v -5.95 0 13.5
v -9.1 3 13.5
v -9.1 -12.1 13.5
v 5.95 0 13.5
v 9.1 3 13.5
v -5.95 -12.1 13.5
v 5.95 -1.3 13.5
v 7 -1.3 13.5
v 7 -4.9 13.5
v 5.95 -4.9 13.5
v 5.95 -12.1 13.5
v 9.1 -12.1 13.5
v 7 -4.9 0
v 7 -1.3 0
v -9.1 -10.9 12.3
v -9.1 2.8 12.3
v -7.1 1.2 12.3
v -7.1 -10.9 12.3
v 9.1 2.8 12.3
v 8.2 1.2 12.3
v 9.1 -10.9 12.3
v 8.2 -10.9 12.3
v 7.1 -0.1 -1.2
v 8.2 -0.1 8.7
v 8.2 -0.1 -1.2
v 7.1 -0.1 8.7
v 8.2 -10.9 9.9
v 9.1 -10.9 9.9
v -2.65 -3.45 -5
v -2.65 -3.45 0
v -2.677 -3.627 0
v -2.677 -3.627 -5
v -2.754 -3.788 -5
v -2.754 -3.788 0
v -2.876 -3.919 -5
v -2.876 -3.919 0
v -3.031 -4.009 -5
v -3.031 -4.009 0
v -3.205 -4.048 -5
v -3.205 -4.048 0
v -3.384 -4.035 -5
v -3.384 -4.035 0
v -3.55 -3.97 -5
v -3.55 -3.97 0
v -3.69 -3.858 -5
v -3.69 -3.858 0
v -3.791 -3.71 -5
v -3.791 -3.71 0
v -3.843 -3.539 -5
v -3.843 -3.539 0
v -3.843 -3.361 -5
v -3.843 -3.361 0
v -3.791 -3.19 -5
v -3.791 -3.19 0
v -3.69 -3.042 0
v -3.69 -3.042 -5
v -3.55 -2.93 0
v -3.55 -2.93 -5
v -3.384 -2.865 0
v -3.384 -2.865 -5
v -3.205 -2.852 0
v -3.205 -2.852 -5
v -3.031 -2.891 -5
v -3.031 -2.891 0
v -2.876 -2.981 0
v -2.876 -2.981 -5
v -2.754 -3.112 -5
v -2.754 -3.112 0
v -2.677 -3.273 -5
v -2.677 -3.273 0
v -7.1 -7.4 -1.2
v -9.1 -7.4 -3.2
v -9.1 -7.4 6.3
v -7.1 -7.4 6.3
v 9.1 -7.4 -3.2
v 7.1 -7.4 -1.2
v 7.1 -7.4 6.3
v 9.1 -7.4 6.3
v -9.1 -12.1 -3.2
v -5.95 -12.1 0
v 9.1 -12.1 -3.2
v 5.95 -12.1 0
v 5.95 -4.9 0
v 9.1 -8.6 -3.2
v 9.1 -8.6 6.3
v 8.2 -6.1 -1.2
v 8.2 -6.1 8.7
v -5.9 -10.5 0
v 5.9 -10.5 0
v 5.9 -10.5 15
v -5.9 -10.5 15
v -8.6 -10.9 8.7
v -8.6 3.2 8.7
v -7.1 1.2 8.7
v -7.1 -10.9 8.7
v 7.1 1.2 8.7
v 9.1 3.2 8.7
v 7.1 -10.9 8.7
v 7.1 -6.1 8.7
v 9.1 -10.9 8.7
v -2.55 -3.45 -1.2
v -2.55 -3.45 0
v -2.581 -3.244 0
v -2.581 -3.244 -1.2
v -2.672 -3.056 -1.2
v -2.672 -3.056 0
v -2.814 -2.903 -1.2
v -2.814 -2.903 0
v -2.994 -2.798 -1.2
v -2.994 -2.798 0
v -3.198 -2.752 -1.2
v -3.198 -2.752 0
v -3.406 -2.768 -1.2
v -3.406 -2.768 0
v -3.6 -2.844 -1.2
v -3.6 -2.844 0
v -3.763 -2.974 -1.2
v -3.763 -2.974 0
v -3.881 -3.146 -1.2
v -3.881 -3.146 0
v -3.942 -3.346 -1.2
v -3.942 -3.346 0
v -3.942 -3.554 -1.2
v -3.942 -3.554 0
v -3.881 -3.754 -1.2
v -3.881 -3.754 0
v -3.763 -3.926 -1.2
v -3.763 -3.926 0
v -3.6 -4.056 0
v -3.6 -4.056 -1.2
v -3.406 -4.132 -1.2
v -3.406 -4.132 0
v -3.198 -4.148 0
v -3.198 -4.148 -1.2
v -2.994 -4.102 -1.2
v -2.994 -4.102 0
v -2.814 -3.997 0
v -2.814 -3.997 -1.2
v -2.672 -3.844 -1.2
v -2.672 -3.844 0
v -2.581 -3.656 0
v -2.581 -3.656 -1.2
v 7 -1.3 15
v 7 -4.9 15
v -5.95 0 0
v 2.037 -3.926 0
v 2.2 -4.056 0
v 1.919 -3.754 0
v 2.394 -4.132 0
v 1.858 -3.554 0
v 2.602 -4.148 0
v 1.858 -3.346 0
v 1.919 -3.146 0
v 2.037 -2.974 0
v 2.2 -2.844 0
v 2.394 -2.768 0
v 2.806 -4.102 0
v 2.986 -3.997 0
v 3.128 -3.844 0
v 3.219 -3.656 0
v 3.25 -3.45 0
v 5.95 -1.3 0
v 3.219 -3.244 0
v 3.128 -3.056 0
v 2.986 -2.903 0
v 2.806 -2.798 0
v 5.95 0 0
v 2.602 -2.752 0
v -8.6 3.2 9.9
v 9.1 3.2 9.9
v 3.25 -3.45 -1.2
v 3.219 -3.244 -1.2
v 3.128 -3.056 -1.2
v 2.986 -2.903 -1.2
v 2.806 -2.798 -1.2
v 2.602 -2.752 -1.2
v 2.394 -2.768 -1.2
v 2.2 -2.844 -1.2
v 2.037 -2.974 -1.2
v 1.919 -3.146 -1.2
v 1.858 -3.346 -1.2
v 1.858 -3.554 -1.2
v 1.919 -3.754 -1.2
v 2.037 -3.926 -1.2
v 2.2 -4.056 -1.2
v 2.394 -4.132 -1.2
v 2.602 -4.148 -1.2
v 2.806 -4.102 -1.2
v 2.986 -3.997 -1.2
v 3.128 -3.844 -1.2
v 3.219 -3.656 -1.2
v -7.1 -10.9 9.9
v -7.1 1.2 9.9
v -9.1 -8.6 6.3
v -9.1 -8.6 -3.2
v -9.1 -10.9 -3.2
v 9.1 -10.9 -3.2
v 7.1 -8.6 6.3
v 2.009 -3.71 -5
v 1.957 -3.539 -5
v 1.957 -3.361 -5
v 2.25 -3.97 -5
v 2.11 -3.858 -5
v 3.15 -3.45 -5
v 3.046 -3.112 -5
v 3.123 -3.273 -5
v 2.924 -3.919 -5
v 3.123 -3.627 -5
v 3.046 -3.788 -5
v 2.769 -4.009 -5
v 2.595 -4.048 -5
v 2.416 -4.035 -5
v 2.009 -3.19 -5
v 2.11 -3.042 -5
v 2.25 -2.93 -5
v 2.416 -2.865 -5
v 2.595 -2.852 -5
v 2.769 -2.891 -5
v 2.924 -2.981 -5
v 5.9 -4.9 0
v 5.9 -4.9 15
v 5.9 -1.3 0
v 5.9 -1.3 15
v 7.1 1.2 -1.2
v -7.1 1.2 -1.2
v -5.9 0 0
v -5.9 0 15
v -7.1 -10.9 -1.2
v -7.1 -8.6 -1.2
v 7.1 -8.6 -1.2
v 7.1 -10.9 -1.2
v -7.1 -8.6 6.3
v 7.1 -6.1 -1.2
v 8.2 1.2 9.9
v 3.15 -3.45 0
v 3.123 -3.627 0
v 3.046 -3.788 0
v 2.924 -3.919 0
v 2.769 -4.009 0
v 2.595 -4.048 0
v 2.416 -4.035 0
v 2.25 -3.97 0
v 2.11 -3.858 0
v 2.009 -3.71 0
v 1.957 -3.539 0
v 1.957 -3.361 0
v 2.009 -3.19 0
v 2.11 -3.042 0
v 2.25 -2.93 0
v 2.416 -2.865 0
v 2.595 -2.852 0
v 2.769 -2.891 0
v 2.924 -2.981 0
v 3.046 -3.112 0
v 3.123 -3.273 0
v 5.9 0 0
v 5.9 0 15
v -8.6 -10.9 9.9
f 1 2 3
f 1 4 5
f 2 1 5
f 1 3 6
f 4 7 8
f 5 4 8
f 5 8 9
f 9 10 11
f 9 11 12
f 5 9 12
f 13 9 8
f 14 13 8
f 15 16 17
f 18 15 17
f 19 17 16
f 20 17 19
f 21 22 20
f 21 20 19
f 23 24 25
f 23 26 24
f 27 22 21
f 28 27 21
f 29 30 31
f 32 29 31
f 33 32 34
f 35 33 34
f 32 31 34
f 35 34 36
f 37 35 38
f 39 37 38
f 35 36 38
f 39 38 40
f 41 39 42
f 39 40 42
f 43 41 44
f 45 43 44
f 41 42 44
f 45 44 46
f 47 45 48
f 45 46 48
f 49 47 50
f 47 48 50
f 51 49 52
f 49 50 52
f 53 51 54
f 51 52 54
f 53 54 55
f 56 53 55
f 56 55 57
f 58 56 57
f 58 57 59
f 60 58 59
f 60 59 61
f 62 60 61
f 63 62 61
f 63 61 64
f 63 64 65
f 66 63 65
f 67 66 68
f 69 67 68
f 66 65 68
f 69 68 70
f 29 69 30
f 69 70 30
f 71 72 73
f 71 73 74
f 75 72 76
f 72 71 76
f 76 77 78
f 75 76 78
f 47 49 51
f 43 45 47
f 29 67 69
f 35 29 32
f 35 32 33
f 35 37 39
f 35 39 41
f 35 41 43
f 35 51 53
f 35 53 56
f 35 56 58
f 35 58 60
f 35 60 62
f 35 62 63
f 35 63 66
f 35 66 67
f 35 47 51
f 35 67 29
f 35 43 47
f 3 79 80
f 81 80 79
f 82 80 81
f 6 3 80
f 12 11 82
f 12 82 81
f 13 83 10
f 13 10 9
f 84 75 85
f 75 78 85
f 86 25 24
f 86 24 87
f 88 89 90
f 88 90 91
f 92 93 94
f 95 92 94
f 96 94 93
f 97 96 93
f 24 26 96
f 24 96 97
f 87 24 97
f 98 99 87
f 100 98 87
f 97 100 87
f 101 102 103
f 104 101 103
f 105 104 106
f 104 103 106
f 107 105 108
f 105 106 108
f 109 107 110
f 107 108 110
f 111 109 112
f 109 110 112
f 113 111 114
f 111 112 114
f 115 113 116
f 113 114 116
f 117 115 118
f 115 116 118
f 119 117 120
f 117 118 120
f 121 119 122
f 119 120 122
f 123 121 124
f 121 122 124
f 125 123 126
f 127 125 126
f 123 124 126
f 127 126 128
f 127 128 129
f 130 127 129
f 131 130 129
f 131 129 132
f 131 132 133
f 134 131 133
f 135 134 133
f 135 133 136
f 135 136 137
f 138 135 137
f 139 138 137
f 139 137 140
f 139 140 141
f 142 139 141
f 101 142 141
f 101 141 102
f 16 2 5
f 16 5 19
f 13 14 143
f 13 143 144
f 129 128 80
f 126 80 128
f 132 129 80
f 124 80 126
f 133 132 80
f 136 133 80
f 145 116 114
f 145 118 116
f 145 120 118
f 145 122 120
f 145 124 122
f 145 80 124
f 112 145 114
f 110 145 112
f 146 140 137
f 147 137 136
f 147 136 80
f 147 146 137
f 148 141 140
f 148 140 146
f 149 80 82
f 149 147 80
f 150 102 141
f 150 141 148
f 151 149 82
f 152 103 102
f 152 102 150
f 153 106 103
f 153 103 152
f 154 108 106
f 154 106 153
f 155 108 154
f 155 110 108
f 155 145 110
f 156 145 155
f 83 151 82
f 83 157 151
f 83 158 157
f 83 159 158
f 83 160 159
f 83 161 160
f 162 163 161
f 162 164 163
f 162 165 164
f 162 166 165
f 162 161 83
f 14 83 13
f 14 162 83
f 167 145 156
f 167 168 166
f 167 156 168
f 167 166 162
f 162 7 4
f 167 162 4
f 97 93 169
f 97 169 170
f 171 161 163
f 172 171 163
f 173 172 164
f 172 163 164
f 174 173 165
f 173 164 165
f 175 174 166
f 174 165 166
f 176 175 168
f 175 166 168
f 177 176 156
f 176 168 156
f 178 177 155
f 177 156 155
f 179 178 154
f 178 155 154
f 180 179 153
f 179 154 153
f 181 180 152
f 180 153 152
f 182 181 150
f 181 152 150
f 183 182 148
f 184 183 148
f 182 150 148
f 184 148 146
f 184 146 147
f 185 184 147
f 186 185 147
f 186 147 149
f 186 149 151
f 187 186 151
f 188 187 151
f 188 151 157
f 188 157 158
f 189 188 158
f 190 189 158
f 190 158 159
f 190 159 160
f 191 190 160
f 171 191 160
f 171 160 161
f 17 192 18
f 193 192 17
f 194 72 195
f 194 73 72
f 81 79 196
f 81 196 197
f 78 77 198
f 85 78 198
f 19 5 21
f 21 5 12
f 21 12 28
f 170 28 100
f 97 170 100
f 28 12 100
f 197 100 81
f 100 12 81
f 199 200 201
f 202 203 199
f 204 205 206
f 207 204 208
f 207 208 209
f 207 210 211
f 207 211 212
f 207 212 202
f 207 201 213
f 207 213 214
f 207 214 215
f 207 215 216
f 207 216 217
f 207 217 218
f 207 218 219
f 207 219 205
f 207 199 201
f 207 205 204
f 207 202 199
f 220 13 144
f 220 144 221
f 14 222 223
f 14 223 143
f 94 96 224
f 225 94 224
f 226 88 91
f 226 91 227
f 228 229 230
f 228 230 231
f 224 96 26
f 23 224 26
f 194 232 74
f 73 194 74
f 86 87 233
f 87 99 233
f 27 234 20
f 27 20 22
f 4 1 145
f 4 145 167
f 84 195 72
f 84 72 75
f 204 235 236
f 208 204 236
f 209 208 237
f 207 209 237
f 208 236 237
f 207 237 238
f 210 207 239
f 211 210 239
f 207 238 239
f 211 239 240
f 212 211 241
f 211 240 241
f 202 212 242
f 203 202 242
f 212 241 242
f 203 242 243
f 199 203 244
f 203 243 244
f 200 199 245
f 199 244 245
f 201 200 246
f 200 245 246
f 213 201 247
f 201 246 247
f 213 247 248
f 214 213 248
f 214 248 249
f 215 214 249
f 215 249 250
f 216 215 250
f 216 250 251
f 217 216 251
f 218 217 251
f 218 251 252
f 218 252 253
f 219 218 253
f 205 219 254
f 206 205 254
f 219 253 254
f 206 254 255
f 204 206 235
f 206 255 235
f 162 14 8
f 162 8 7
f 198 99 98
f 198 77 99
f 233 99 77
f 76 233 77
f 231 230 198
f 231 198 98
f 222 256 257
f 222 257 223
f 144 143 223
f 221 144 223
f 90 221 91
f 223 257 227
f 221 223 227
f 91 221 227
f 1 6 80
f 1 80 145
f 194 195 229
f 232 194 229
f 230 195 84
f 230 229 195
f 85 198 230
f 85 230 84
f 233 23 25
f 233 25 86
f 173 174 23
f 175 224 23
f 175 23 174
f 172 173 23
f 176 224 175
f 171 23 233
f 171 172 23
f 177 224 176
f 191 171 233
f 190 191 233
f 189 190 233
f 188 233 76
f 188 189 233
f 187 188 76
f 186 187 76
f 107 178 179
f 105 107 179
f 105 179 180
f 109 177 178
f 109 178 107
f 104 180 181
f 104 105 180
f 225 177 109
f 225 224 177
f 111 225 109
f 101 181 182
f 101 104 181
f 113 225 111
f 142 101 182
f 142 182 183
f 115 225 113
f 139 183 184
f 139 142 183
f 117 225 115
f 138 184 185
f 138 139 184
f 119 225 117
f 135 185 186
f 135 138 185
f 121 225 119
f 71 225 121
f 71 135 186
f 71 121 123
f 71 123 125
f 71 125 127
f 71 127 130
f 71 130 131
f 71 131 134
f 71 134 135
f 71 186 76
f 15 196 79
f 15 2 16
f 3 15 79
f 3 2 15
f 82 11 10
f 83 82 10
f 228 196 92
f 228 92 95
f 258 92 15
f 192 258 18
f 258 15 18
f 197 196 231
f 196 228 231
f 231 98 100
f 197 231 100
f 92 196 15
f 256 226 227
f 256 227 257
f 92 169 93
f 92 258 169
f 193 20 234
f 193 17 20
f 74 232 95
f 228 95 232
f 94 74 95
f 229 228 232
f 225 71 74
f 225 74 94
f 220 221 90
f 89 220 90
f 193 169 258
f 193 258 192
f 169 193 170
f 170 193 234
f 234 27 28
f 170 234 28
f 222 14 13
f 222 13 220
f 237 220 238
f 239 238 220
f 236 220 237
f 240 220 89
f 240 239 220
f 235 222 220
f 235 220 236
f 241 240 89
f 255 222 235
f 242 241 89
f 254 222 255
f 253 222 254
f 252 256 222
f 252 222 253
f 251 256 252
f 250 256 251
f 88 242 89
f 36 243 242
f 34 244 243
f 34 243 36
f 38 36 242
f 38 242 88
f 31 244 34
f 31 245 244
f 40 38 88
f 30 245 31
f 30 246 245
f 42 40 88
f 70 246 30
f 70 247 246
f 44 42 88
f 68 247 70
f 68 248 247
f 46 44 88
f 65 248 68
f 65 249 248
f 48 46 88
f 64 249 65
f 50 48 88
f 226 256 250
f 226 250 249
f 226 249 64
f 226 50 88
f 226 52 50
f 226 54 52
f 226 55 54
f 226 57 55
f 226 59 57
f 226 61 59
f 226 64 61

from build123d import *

# Parameters (mm, degrees)
PAD_DEPTH       = 15
SKETCH001_R     = 0.6
PAD001_DEPTH    = 5
SKETCH002_R     = 0.6
PAD002_DEPTH    = 5
PAD003_DEPTH    = 1.2
PAD004_DEPTH    = 13.5
SKETCH005_W     = 1.2
SKETCH005_H     = 14.7
PAD005_DEPTH    = 2
SKETCH006_W     = 1.2
SKETCH006_H     = 14.7
PAD006_DEPTH    = 2
PAD007_DEPTH    = 1.2
SKETCH008_W     = 2
SKETCH008_H     = 12.1
PAD008_DEPTH    = 1.2
SKETCH009_W     = 18.2
SKETCH009_H     = 1.2
PAD009_DEPTH    = 2
SKETCH010_W     = 18.2
SKETCH010_H     = 1.2
PAD010_DEPTH    = 2
SKETCH011_W     = 6
SKETCH011_H     = 1.2
PAD011_DEPTH    = 0.1
SKETCH012_W     = 1.2
SKETCH012_H     = 7.5
PAD012_DEPTH    = 2
SKETCH013_W     = 1.2
SKETCH013_H     = 7.5
PAD013_DEPTH    = 2
SKETCH014_W     = 18.2
SKETCH014_H     = 1.2
PAD014_DEPTH    = 2
SKETCH015_W     = 12.1
SKETCH015_H     = 1.2
PAD015_DEPTH    = 1.5
SKETCH016_W     = 4.8
SKETCH016_H     = 1.2
PAD016_DEPTH    = 2
SKETCH017_W     = 1.3
SKETCH017_H     = 1.2
PAD017_DEPTH    = 2
SKETCH018_W     = 6
SKETCH018_H     = 1.2
PAD018_DEPTH    = 0.9
SKETCH019_W     = 17.7
SKETCH019_H     = 1.2
PAD019_DEPTH    = 2
SKETCH020_R     = 0.6
POCKET_DEPTH    = 5
SKETCH021_R     = 0.6
POCKET001_DEPTH = 5
SKETCH022_W     = 4.8
SKETCH022_H     = 2.4
PAD020_DEPTH    = 1.1
SKETCH023_W     = 1.3
SKETCH023_H     = 2.4
PAD021_DEPTH    = 1.1
POCKET002_DEPTH = 18.201
SKETCH025_W     = 0.05
SKETCH025_H     = 12.1
POCKET003_DEPTH = 13.5
SKETCH026_W     = 0.05
SKETCH026_H     = 12.1
POCKET004_DEPTH = 13.5
SKETCH027_R     = 0.7
POCKET005_DEPTH = 5
SKETCH028_R     = 0.7
POCKET006_DEPTH = 5


with BuildPart() as stecker_und_pins:
    # Sketch → Pad (new body)
    with BuildSketch(Plane.XY):
        Polygon((-5.9, 0), (5.9, 0), (5.9, -1.3), (7, -1.3), (7, -4.9), (5.9, -4.9), (5.9, -10.5), (-5.9, -10.5), align=None)
    extrude(amount=PAD_DEPTH)

    # Sketch001 → Pad001 (new body)
    with BuildSketch(Plane(origin=(0, 0, 0), x_dir=(1, 0, 0), z_dir=(0, 0, -1))):
        with Locations((2.55, 3.45)):
            Circle(SKETCH001_R)
    extrude(amount=PAD001_DEPTH)

    # Sketch002 → Pad002 (new body)
    with BuildSketch(Plane(origin=(0, 0, 0), x_dir=(1, 0, 0), z_dir=(0, 0, -1))):
        with Locations((-3.25, 3.45)):
            Circle(SKETCH002_R)
    extrude(amount=PAD002_DEPTH)


with BuildPart() as pocket006:
    # Sketch003 → Pad003 (new body)
    with BuildSketch(Plane(origin=(0, 0, 0), x_dir=(1, 0, 0), z_dir=(0, 0, -1))):
        Polygon((-7.1, -1.2), (-7.1, 12.1), (7.1, 12.1), (7.1, 6.1), (8.1, 6.1), (8.1, 0.1), (7.1, 0.1), (7.1, -1.2), align=None)
    extrude(amount=PAD003_DEPTH)

    # Sketch004 → Pad004 (new body)
    with BuildSketch(Plane.XY):
        Polygon((-7.1, -12.1), (-7.1, 1.2), (7.1, 1.2), (7.1, -0.1), (8.2, -0.1), (8.2, -6.1), (7.1, -6.1), (7.1, -12.1), (5.9, -12.1), (5.9, -4.9), (7, -4.9), (7, -1.3), (5.9, -1.3), (5.9, 0), (-5.9, 0), (-5.9, -12.1), align=None)
    extrude(amount=PAD004_DEPTH)

    # Sketch005 → Pad005 (new body)
    with BuildSketch(Plane(origin=(7.1, 0, 0), x_dir=(0, -1, 0), z_dir=(1, 0, 0))):
        with Locations((11.5, -6.15)):
            Rectangle(SKETCH005_W, SKETCH005_H)
    extrude(amount=PAD005_DEPTH)

    # Sketch006 → Pad006 (new body)
    with BuildSketch(Plane(origin=(-7.1, 0, 0), x_dir=(0, 1, 0), z_dir=(-1, 0, 0))):
        with Locations((-11.5, -6.15)):
            Rectangle(SKETCH006_W, SKETCH006_H)
    extrude(amount=PAD006_DEPTH)

    # Sketch007 → Pad007 (new body)
    with BuildSketch(Plane.XY.offset(13.5)):
        Polygon((7.1, 1.2), (7.1, -0.1), (8.2, -0.1), (8.2, -6.1), (7.1, -6.1), (7.1, -10.9), (9.1, -10.9), (9.1, 1.2), align=None)
    extrude(amount=-PAD007_DEPTH)

    # Sketch008 → Pad008 (new body)
    with BuildSketch(Plane.XY.offset(13.5)):
        with Locations((-8.1, -4.85)):
            Rectangle(SKETCH008_W, SKETCH008_H)
    extrude(amount=-PAD008_DEPTH)

    # Sketch009 → Pad009 (new body)
    with BuildSketch(Plane(origin=(0, 1.2, 0), x_dir=(1, 0, 0), z_dir=(0, 1, 0))):
        with Locations((0, -12.9)):
            Rectangle(SKETCH009_W, SKETCH009_H)
    extrude(amount=PAD009_DEPTH)

    # Sketch010 → Pad010 (new body)
    with BuildSketch(Plane(origin=(0, 0, -1.2), x_dir=(1, 0, 0), z_dir=(0, 0, -1))):
        with Locations((0, 11.5)):
            Rectangle(SKETCH010_W, SKETCH010_H)
    extrude(amount=PAD010_DEPTH)

    # Sketch011 → Pad011 (new body)
    with BuildSketch(Plane(origin=(8.1, 0, 0), x_dir=(0, -1, 0), z_dir=(1, 0, 0))):
        with Locations((3.1, 0.6)):
            Rectangle(SKETCH011_W, SKETCH011_H)
    extrude(amount=PAD011_DEPTH)

    # Sketch012 → Pad012 (new body)
    with BuildSketch(Plane(origin=(7.1, 0, 0), x_dir=(0, -1, 0), z_dir=(1, 0, 0))):
        with Locations((8, -2.55)):
            Rectangle(SKETCH012_W, SKETCH012_H)
    extrude(amount=PAD012_DEPTH)

    # Sketch013 → Pad013 (new body)
    with BuildSketch(Plane(origin=(-7.1, 0, 0), x_dir=(0, 1, 0), z_dir=(-1, 0, 0))):
        with Locations((-8, -2.55)):
            Rectangle(SKETCH013_W, SKETCH013_H)
    extrude(amount=PAD013_DEPTH)

    # Sketch014 → Pad014 (new body)
    with BuildSketch(Plane(origin=(0, 0, -1.2), x_dir=(1, 0, 0), z_dir=(0, 0, -1))):
        with Locations((0, 8)):
            Rectangle(SKETCH014_W, SKETCH014_H)
    extrude(amount=PAD014_DEPTH)

    # Sketch015 → Pad015 (new body)
    with BuildSketch(Plane(origin=(-7.1, 0, 0), x_dir=(0, 1, 0), z_dir=(-1, 0, 0))):
        with Locations((-4.85, -9.3)):
            Rectangle(SKETCH015_W, SKETCH015_H)
    extrude(amount=PAD015_DEPTH)

    # Sketch016 → Pad016 (new body)
    with BuildSketch(Plane(origin=(7.1, 0, 0), x_dir=(0, -1, 0), z_dir=(1, 0, 0))):
        with Locations((8.5, -9.3)):
            Rectangle(SKETCH016_W, SKETCH016_H)
    extrude(amount=PAD016_DEPTH)

    # Sketch017 → Pad017 (new body)
    with BuildSketch(Plane(origin=(7.1, 0, 0), x_dir=(0, -1, 0), z_dir=(1, 0, 0))):
        with Locations((-0.55, -9.3)):
            Rectangle(SKETCH017_W, SKETCH017_H)
    extrude(amount=PAD017_DEPTH)

    # Sketch018 → Pad018 (new body)
    with BuildSketch(Plane(origin=(8.2, 0, 0), x_dir=(0, -1, 0), z_dir=(1, 0, 0))):
        with Locations((3.1, -9.3)):
            Rectangle(SKETCH018_W, SKETCH018_H)
    extrude(amount=PAD018_DEPTH)

    # Sketch019 → Pad019 (new body)
    with BuildSketch(Plane(origin=(0, 1.2, 0), x_dir=(1, 0, 0), z_dir=(0, 1, 0))):
        with Locations((0.25, -9.3)):
            Rectangle(SKETCH019_W, SKETCH019_H)
    extrude(amount=PAD019_DEPTH)

    # Sketch020 → Pocket (cut)
    with BuildSketch(Plane(origin=(0, 0, -1.2), x_dir=(1, 0, 0), z_dir=(0, 0, -1))):
        with Locations((-3.25, 3.45)):
            Circle(SKETCH020_R)
    extrude(amount=-POCKET_DEPTH, mode=Mode.SUBTRACT)

    # Sketch021 → Pocket001 (cut)
    with BuildSketch(Plane(origin=(0, 0, -1.2), x_dir=(1, 0, 0), z_dir=(0, 0, -1))):
        with Locations((2.55, 3.45)):
            Circle(SKETCH021_R)
    extrude(amount=-POCKET001_DEPTH, mode=Mode.SUBTRACT)

    # Sketch022 → Pad020 (new body)
    with BuildSketch(Plane(origin=(7.1, 0, 0), x_dir=(0, -1, 0), z_dir=(1, 0, 0))):
        with Locations((8.5, -11.1)):
            Rectangle(SKETCH022_W, SKETCH022_H)
    extrude(amount=PAD020_DEPTH)

    # Sketch023 → Pad021 (new body)
    with BuildSketch(Plane(origin=(7.1, 0, 0), x_dir=(0, -1, 0), z_dir=(1, 0, 0))):
        with Locations((-0.55, -11.1)):
            Rectangle(SKETCH023_W, SKETCH023_H)
    extrude(amount=PAD021_DEPTH)

    # Sketch024 → Pocket002 (cut, through all)
    with BuildSketch(Plane(origin=(9.1, 0, 0), x_dir=(0, -1, 0), z_dir=(1, 0, 0))):
        Polygon((-3.2, -13.5), (-3, -13.5), (-2.8, -12.3), (-3.2, -12.3), align=None)
    extrude(amount=-POCKET002_DEPTH, mode=Mode.SUBTRACT)

    # Sketch025 → Pocket003 (cut)
    with BuildSketch(Plane.XY.offset(13.5)):
        with Locations((5.925, -6.05)):
            Rectangle(SKETCH025_W, SKETCH025_H)
    extrude(amount=-POCKET003_DEPTH, mode=Mode.SUBTRACT)

    # Sketch026 → Pocket004 (cut)
    with BuildSketch(Plane.XY.offset(13.5)):
        with Locations((-5.925, -6.05)):
            Rectangle(SKETCH026_W, SKETCH026_H)
    extrude(amount=-POCKET004_DEPTH, mode=Mode.SUBTRACT)

    # Sketch027 → Pocket005 (cut)
    with BuildSketch(Plane.XY):
        with Locations((2.55, -3.45)):
            Circle(SKETCH027_R)
    extrude(amount=-POCKET005_DEPTH, mode=Mode.SUBTRACT)

    # Sketch028 → Pocket006 (cut)
    with BuildSketch(Plane.XY):
        with Locations((-3.25, -3.45)):
            Circle(SKETCH028_R)
    extrude(amount=-POCKET006_DEPTH, mode=Mode.SUBTRACT)


solid = Compound([stecker_und_pins.part, pocket006.part])
